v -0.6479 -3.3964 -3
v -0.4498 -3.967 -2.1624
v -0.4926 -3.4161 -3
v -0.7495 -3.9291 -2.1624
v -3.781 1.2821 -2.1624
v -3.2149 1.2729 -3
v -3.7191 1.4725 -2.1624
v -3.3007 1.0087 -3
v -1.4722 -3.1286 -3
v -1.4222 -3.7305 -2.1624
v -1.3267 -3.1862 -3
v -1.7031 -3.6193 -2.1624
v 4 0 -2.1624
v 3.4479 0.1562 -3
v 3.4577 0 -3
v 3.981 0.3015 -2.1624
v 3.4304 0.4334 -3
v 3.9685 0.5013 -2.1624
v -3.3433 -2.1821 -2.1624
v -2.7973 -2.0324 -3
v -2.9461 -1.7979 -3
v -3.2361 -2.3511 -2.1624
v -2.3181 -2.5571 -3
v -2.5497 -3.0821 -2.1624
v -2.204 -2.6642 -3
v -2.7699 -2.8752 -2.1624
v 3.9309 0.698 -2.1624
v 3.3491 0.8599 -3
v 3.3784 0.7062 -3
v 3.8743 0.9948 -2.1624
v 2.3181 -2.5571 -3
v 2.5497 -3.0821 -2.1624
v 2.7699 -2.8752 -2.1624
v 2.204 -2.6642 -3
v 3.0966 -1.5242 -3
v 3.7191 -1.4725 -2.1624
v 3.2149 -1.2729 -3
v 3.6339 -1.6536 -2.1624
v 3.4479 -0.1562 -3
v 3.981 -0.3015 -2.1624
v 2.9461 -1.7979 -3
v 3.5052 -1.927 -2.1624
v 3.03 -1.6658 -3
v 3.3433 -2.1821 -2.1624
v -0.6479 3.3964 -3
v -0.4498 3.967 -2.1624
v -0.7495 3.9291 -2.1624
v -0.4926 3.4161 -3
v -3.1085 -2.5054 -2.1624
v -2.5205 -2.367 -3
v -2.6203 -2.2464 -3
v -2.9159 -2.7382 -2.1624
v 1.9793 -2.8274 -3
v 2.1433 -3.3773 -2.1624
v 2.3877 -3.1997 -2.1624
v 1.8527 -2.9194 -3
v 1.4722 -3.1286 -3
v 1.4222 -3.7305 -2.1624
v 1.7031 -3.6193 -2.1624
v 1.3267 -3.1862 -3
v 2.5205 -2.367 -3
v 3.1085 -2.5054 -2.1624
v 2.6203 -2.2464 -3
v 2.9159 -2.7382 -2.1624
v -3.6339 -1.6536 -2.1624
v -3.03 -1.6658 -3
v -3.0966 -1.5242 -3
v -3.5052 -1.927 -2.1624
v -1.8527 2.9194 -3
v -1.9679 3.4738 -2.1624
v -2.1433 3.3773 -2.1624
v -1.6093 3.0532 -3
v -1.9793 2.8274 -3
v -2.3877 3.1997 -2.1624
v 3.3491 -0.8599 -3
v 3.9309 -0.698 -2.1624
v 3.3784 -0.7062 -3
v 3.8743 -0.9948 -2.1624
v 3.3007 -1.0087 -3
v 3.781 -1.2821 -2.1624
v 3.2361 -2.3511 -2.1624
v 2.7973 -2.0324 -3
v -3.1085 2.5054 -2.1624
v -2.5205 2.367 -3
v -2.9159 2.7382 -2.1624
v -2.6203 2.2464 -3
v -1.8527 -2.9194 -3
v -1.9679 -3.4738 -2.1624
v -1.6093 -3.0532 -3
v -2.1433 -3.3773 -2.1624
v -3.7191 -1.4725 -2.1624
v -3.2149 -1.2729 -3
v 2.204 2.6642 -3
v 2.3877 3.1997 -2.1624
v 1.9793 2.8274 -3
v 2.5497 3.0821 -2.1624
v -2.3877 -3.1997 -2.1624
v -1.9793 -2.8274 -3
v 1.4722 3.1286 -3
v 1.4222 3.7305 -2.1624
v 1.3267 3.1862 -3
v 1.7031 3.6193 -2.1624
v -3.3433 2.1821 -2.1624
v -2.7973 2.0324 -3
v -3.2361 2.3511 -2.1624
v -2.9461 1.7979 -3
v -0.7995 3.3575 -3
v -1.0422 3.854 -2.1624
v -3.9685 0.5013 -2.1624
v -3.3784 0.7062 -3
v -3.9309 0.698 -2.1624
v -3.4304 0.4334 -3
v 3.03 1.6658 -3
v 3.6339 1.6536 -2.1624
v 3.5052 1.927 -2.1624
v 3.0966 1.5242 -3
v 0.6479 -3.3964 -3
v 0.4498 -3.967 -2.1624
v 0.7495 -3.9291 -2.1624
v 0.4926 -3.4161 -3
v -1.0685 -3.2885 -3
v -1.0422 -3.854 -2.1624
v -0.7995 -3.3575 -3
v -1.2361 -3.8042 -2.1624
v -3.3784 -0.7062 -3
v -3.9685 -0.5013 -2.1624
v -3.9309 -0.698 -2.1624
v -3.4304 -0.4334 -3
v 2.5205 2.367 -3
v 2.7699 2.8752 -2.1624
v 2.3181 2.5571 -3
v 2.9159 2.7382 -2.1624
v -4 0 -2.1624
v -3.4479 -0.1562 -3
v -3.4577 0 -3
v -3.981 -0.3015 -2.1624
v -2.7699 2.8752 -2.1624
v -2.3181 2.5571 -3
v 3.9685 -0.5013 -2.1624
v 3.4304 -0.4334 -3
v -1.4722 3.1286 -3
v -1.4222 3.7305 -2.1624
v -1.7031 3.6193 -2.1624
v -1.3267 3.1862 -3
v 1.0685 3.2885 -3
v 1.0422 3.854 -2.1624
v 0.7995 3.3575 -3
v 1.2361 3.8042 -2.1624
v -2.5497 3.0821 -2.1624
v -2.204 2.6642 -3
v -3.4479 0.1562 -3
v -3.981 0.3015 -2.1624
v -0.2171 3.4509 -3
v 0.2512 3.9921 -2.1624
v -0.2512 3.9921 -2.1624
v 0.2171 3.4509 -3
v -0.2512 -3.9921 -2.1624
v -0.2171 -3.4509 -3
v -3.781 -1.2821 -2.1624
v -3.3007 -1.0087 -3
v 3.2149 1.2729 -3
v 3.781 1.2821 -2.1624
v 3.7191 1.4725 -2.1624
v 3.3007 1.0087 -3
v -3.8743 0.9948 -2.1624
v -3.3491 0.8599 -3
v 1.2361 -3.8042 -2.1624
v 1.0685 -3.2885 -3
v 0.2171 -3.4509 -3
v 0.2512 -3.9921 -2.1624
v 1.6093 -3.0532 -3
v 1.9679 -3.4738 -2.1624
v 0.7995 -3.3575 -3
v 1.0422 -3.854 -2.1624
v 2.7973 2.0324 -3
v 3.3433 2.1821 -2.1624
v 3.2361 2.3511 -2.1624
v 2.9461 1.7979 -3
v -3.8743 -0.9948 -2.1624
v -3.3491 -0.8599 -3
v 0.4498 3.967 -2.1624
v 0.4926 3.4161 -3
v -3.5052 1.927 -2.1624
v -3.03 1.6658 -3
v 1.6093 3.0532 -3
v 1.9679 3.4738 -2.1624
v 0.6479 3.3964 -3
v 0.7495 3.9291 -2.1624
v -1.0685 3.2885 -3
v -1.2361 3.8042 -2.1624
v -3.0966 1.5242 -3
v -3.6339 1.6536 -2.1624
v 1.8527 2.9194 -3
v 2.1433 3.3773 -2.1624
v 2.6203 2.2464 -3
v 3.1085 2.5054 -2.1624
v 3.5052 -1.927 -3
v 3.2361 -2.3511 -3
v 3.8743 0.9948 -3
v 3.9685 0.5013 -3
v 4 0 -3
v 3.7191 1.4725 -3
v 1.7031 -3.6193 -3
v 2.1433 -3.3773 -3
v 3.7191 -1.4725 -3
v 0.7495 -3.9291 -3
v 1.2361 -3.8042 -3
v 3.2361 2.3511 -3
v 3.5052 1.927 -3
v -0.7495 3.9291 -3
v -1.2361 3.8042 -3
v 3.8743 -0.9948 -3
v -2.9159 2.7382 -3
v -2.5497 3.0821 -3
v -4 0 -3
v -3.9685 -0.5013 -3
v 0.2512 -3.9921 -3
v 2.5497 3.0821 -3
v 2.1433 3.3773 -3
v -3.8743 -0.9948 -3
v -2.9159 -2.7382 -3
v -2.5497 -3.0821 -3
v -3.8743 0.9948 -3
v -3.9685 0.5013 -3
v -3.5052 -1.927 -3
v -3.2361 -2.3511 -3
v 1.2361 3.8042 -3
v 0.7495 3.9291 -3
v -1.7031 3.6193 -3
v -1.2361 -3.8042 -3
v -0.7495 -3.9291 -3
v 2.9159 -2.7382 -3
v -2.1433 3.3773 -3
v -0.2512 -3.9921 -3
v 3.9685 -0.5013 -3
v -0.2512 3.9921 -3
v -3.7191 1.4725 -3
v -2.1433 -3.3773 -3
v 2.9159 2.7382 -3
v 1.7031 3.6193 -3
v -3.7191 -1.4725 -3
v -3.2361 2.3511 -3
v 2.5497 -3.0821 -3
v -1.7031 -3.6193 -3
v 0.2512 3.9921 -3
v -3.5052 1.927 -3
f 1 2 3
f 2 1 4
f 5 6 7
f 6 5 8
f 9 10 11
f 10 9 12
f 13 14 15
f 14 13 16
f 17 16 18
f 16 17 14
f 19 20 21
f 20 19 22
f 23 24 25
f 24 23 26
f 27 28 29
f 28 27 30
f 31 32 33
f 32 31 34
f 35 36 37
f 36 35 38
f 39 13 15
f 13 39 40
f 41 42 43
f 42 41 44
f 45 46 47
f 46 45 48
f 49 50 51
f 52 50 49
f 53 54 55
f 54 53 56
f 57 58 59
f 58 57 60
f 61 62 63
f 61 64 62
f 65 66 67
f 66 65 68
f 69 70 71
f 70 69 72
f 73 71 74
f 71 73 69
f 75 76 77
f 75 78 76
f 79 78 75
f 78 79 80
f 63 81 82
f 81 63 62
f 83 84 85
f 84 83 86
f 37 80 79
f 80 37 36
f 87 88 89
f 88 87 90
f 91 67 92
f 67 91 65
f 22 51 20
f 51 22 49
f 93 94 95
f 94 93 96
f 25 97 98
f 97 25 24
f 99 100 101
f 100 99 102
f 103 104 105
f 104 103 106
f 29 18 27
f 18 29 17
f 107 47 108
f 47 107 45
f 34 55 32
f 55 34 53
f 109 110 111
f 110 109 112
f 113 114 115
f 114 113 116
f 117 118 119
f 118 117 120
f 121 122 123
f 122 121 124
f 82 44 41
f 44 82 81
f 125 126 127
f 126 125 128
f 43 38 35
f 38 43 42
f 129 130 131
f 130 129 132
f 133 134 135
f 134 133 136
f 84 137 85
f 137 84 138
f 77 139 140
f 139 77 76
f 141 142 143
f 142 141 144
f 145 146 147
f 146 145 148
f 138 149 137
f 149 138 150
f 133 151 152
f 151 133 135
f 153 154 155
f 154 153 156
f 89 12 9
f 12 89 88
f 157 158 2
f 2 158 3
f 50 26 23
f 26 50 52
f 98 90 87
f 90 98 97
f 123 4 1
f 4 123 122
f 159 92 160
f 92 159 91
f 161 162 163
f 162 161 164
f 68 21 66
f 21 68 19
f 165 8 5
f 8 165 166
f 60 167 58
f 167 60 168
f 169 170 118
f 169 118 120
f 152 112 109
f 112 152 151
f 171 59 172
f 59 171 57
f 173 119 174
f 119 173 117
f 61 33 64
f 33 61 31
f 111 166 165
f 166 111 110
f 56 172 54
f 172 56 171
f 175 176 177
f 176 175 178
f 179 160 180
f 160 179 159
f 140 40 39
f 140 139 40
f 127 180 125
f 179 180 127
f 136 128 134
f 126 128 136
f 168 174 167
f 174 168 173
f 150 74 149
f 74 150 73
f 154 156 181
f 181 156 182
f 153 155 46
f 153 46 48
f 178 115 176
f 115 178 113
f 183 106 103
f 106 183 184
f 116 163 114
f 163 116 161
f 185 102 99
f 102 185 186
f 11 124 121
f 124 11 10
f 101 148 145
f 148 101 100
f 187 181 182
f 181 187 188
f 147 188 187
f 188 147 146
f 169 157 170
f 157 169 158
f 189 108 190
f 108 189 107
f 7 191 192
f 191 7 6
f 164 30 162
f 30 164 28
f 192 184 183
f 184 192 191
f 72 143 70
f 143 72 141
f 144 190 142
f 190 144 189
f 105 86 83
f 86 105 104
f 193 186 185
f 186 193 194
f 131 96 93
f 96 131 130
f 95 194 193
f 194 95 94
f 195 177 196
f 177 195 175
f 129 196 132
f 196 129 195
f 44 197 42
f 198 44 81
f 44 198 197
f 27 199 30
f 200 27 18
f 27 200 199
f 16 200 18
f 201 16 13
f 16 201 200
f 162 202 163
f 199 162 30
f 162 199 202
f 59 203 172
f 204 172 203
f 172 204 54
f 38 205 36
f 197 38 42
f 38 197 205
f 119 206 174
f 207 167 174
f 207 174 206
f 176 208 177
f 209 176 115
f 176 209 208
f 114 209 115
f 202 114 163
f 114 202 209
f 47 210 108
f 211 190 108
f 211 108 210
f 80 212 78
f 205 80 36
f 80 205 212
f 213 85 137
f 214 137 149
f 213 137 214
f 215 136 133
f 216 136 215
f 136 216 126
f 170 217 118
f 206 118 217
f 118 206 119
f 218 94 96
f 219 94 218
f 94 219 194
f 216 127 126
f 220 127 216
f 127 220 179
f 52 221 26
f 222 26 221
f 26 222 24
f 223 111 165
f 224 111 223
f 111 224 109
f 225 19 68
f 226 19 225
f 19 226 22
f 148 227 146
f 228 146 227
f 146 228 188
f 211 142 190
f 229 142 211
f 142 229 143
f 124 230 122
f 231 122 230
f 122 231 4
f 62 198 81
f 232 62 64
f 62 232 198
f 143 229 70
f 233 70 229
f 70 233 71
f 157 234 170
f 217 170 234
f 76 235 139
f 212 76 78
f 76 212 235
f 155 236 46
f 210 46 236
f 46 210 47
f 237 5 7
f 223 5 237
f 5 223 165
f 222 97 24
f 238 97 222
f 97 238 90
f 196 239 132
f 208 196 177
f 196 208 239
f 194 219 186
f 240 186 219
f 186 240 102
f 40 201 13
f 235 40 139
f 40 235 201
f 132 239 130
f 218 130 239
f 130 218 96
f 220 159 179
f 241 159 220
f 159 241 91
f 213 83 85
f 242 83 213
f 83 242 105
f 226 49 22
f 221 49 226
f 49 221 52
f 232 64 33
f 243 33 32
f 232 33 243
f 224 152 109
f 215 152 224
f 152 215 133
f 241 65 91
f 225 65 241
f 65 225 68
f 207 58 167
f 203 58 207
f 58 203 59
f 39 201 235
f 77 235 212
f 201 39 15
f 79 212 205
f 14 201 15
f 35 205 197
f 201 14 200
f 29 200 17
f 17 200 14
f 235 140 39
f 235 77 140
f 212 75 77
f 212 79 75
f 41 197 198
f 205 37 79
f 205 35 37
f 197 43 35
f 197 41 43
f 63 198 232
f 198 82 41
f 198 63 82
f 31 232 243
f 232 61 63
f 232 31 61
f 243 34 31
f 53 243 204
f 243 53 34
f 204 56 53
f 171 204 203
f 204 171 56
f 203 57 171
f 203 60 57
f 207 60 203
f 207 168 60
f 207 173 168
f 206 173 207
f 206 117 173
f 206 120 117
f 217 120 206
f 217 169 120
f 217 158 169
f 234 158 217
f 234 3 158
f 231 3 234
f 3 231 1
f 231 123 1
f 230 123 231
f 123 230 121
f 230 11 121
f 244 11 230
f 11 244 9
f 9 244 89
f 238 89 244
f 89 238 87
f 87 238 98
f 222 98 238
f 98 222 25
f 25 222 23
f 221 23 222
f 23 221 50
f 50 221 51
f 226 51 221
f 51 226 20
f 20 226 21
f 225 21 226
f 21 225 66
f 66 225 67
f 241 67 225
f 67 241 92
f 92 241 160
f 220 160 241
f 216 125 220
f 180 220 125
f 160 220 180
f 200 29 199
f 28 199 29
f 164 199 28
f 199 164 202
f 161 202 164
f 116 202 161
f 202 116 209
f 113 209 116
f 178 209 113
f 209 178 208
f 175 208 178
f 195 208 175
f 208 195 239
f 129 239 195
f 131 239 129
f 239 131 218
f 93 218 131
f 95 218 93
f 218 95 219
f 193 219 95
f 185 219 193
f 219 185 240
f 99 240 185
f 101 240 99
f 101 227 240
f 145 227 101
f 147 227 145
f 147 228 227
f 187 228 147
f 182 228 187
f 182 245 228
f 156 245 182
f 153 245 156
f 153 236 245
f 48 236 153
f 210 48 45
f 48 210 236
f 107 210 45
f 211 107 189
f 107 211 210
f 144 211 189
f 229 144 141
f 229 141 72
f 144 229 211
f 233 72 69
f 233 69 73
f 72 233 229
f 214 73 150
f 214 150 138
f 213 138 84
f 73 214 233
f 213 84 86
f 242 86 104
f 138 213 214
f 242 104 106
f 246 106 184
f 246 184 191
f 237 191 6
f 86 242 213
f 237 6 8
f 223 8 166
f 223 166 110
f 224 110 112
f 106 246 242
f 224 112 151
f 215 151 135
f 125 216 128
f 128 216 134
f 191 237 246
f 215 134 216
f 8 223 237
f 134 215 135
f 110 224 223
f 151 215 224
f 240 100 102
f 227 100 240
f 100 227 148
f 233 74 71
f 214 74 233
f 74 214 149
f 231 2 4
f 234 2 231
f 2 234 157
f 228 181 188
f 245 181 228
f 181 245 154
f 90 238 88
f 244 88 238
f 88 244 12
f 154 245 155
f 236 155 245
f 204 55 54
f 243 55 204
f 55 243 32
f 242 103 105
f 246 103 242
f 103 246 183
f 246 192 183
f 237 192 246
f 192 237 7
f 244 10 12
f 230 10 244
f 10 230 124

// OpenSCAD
$fn = 50;

difference() {
	union() {
		translate(v = [0, 0, -3.0]) {
			cylinder(h = 6, r = 4.0);
		}
	}
	union() {
		translate(v = [0, 0, 0]) {
			rotate(a = [0, 0, 0]) {
				difference() {
					union() {
						translate(v = [0, 0, -6.0]) {
							cylinder(h = 6, r = 2.6);
						}
						translate(v = [0, 0, -3.9]) {
							cylinder(h = 3.9, r1 = 2.875, r2 = 5.4);
						}
						translate(v = [0, 0, -6.0]) {
							cylinder(h = 6, r = 2.875);
						}
						translate(v = [0, 0, -6.0]) {
							cylinder(h = 6, r = 2.6);
						}
					}
					union();
				}
			}
		}
		#cylinder(h = 3, r = 5.0);
	}
}
